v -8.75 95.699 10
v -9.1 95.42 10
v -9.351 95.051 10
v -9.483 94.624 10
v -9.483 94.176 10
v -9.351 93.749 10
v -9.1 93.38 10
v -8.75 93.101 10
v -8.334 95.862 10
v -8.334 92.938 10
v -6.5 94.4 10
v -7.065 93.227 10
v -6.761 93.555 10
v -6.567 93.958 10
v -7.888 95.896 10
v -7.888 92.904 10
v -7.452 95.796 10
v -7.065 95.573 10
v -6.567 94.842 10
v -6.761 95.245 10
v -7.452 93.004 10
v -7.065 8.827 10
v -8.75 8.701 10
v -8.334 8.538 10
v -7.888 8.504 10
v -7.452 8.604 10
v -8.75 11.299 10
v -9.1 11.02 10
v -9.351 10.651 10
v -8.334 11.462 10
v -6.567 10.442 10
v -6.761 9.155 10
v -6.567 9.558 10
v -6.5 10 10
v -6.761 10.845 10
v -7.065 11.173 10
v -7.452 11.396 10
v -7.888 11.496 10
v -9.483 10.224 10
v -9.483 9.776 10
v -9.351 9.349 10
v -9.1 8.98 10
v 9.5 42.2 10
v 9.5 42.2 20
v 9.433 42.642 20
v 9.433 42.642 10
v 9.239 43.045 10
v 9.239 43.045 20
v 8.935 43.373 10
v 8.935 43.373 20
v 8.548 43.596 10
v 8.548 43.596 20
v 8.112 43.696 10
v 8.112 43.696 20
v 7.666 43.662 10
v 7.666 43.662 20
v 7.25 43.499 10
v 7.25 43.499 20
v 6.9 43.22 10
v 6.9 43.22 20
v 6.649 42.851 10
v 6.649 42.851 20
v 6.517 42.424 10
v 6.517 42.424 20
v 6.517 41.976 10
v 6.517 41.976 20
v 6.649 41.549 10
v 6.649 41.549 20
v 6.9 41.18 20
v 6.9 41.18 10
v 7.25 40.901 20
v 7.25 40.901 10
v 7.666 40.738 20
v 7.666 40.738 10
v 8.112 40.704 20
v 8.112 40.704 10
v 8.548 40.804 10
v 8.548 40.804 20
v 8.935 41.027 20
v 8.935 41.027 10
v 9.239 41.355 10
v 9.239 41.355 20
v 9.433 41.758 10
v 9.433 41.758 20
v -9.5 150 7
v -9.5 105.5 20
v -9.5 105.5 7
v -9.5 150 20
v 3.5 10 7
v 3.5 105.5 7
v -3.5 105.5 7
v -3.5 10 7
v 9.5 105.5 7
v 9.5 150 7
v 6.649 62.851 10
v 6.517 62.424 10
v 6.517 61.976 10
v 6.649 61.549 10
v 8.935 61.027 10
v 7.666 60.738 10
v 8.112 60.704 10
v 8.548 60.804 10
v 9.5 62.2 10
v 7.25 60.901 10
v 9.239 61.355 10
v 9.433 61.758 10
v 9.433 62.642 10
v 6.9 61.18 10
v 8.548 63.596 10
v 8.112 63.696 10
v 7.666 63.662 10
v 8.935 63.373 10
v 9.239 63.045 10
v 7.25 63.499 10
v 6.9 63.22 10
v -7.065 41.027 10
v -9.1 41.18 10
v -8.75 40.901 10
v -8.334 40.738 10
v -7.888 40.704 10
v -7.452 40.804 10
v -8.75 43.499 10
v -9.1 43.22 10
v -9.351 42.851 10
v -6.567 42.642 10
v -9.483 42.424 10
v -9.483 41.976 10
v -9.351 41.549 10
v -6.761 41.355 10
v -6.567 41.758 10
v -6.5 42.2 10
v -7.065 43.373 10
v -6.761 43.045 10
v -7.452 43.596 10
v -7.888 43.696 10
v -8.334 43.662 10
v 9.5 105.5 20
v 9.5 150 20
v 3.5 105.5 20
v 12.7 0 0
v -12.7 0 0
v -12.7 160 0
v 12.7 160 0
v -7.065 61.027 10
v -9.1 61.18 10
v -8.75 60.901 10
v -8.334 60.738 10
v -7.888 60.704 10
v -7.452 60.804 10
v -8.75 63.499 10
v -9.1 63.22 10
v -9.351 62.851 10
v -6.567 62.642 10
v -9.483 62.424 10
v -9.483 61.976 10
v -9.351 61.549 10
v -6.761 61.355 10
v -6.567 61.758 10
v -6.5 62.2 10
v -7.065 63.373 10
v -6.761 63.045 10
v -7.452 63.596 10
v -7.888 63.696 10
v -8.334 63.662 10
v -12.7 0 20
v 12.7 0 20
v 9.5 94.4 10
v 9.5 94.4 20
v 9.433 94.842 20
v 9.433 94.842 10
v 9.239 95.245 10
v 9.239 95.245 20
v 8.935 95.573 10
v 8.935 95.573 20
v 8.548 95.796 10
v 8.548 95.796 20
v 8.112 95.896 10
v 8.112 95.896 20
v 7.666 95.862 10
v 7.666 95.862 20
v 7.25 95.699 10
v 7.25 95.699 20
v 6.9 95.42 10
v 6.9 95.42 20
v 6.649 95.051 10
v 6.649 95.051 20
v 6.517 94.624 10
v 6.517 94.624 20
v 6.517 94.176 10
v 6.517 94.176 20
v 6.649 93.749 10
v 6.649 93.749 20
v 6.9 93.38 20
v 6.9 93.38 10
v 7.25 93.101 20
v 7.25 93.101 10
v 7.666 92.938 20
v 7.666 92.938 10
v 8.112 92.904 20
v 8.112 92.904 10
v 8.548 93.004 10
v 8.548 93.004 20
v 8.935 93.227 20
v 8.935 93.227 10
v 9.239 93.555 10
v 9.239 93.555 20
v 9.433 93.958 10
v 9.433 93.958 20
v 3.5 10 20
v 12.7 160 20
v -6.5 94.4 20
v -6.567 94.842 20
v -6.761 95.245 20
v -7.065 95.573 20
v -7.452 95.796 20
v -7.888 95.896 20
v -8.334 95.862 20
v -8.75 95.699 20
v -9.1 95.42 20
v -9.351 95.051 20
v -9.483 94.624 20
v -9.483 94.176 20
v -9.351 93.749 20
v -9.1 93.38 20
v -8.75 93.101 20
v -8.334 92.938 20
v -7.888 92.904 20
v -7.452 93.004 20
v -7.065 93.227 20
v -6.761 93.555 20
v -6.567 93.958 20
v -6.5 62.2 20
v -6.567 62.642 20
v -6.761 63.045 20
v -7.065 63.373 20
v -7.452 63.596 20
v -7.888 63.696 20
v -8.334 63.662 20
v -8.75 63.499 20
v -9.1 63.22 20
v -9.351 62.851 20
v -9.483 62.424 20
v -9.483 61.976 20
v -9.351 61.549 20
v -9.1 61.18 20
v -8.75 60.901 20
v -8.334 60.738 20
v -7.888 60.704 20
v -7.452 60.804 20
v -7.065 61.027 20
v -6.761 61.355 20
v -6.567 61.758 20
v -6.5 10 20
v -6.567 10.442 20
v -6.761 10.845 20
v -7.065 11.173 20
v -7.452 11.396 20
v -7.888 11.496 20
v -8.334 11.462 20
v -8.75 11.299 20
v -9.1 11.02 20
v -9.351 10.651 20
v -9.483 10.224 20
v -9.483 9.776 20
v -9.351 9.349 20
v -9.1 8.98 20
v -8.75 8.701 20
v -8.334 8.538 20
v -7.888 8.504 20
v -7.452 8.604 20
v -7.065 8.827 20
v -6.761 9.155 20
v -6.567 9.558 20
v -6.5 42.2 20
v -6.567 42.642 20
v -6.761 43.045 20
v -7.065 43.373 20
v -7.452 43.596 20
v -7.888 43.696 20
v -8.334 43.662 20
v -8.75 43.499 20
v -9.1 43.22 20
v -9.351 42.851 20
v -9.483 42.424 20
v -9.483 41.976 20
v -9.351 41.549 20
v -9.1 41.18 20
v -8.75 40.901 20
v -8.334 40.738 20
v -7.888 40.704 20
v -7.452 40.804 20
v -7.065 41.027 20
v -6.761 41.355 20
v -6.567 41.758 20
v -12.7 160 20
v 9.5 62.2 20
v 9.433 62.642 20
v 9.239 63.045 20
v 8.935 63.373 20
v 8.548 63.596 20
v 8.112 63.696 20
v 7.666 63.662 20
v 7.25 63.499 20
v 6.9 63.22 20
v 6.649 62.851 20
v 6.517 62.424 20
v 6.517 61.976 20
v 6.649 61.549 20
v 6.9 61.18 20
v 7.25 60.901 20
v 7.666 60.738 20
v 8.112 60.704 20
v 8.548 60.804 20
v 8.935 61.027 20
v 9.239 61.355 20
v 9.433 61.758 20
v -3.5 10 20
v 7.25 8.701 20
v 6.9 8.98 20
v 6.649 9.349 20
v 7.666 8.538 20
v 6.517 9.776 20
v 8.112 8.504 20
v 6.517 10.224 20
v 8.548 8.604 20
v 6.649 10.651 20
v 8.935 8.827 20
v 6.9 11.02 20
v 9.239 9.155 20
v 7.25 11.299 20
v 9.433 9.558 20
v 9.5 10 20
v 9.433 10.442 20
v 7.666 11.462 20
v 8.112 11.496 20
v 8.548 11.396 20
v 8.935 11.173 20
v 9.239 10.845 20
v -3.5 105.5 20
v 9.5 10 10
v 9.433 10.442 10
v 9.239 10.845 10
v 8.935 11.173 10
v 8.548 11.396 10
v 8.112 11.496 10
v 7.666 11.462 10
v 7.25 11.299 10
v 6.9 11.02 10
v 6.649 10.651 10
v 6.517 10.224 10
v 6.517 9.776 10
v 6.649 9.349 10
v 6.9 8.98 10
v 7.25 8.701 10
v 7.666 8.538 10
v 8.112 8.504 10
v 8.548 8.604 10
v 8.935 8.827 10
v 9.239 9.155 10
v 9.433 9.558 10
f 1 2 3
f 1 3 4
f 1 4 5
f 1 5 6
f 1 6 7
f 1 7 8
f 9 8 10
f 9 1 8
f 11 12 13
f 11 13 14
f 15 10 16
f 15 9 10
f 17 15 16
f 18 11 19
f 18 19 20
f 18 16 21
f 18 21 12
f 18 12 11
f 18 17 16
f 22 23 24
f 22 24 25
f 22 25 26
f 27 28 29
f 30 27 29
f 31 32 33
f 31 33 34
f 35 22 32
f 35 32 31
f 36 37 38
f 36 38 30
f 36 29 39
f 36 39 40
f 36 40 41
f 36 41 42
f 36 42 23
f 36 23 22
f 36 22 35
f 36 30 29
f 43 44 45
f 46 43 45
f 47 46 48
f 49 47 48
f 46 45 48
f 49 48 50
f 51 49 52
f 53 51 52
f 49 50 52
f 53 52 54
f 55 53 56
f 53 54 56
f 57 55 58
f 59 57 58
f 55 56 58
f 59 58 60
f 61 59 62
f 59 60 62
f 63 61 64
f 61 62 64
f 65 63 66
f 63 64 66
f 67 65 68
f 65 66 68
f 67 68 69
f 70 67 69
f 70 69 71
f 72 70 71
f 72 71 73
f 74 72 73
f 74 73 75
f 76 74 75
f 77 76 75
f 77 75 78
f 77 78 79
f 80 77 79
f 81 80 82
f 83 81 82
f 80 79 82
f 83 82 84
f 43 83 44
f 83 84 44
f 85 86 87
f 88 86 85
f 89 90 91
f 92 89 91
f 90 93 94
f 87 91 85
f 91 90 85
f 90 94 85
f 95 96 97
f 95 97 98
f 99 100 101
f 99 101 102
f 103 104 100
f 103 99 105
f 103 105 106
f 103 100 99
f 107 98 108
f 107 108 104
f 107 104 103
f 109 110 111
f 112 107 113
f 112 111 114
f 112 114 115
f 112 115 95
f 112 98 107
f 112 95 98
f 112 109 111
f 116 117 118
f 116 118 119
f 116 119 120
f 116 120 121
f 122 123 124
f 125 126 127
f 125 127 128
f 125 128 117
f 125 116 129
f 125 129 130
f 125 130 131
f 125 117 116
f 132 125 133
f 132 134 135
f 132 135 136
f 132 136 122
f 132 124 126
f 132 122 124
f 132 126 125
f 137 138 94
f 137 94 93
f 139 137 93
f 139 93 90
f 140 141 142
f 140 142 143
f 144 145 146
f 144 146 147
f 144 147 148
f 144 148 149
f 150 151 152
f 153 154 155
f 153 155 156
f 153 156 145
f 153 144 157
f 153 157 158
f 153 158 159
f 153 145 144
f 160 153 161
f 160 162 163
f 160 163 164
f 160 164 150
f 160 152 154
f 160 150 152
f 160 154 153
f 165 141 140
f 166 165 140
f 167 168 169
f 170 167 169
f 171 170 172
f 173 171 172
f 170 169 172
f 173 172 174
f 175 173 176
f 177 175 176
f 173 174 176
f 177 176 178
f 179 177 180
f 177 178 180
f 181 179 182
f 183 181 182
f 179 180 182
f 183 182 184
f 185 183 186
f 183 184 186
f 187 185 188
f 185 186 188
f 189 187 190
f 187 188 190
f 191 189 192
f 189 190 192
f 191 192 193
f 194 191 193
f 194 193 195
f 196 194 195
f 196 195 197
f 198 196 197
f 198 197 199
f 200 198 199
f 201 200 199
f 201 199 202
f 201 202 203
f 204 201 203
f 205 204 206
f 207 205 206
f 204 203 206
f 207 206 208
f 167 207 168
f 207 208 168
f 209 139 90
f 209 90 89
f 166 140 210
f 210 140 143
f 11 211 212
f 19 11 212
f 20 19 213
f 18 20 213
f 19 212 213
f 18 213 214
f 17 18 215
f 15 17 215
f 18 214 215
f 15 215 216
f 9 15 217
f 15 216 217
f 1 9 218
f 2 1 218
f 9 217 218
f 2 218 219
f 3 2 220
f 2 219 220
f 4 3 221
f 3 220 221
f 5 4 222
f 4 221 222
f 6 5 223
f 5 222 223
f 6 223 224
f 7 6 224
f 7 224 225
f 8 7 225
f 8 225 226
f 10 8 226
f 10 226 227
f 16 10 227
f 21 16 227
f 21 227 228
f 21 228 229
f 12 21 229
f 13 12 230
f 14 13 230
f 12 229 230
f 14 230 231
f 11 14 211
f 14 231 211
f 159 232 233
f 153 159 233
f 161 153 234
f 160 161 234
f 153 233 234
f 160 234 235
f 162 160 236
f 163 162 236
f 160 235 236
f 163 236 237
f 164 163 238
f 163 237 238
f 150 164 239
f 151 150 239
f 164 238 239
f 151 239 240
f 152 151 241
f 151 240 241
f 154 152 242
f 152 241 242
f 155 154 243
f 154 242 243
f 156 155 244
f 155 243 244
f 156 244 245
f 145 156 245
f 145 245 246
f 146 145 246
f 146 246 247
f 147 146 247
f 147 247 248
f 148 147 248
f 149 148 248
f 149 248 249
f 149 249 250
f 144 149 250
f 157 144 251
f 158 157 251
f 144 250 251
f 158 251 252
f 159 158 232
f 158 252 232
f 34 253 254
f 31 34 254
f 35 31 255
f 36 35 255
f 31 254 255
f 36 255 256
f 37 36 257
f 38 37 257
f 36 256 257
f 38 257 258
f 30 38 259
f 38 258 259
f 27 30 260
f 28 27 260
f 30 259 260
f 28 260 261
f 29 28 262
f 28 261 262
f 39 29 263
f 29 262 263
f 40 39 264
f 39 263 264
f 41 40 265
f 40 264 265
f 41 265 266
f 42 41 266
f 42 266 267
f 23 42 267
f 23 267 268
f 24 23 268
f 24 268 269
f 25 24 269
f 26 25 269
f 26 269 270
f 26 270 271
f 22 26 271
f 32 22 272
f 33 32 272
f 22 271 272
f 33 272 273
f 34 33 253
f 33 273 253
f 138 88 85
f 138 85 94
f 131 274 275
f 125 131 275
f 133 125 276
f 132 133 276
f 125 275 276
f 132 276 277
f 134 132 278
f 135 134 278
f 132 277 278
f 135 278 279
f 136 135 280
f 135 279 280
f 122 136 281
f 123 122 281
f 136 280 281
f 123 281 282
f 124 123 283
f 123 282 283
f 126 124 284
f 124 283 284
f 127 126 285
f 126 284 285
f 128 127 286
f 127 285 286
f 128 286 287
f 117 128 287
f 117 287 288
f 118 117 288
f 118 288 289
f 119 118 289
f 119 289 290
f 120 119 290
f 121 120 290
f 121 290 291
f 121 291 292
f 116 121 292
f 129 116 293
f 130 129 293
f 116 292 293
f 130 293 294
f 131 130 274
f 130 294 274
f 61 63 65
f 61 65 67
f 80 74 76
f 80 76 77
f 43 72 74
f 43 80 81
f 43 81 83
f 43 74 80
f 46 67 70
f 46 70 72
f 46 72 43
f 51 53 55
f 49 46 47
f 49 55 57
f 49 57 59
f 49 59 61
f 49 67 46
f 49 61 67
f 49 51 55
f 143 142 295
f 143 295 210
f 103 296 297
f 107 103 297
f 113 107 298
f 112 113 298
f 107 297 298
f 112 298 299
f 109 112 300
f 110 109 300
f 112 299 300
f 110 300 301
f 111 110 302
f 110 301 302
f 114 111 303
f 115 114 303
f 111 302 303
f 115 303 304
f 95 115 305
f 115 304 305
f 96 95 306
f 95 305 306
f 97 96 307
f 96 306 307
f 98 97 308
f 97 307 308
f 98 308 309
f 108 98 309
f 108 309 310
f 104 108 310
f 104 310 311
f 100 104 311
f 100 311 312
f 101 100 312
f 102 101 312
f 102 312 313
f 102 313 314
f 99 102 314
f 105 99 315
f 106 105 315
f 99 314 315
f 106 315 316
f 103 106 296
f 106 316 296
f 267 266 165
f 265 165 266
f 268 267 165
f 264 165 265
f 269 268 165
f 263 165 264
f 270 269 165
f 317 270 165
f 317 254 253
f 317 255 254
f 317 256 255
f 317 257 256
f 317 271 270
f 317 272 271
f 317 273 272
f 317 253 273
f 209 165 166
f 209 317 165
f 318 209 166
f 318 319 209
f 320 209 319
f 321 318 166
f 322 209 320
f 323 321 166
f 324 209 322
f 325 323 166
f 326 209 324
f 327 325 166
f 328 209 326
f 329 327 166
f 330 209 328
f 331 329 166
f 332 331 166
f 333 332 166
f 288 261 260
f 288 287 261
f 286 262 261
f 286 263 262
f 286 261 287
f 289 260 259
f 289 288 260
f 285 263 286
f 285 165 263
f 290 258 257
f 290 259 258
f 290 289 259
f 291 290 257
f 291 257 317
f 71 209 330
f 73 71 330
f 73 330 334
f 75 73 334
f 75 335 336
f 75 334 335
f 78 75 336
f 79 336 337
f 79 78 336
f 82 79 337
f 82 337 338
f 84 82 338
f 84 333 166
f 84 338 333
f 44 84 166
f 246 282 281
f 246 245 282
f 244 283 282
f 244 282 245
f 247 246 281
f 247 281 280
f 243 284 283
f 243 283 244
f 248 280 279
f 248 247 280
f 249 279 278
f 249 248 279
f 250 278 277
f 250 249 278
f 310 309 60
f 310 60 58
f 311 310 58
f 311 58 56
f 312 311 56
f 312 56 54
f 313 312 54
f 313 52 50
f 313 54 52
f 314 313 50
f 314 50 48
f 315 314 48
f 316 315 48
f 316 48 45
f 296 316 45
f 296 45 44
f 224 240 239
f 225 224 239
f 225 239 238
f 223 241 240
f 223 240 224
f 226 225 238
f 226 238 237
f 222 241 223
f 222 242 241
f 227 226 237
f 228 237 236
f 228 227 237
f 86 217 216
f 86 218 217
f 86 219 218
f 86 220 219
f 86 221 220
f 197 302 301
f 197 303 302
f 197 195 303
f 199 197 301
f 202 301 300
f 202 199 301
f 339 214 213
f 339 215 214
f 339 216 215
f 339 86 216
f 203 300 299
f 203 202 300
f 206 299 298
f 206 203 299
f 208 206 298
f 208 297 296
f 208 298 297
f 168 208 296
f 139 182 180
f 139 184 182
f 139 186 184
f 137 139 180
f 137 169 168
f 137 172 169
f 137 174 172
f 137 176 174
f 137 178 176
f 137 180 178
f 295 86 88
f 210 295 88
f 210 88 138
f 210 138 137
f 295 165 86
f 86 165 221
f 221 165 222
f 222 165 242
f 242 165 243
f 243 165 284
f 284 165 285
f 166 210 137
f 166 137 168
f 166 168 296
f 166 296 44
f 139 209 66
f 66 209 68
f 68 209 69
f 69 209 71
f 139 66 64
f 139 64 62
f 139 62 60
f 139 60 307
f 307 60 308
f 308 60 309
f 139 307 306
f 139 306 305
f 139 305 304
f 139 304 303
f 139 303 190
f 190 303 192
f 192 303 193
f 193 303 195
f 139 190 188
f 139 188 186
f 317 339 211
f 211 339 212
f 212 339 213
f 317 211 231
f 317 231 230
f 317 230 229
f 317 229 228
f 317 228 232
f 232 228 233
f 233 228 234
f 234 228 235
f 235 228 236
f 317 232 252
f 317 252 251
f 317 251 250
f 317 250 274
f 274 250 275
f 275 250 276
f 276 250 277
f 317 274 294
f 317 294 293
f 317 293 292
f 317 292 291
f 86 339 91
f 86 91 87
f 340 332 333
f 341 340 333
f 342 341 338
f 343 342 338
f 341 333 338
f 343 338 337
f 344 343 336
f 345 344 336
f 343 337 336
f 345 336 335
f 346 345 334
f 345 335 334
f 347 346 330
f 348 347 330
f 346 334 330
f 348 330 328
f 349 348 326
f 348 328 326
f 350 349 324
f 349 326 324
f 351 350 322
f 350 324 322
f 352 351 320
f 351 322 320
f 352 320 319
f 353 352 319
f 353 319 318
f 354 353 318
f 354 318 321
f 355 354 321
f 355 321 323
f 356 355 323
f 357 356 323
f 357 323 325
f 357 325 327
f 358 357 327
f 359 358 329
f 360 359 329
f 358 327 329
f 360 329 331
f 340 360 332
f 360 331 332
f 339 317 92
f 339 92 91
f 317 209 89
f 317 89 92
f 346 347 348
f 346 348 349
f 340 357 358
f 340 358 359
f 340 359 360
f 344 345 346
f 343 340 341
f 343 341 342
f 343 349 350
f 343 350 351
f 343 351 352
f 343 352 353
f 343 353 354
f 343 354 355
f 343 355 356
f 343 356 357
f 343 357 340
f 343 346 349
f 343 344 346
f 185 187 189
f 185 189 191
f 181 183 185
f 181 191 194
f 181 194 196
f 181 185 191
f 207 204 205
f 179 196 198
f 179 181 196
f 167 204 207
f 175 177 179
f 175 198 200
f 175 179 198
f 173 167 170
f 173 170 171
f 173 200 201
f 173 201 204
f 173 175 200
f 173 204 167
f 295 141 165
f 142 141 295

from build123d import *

# Parameters (mm, degrees)
SKETCH_W        = 25.4
SKETCH_H        = 160
PAD_DEPTH       = 20
POCKET_DEPTH    = 13
SKETCH002_R     = 1.5
POCKET001_DEPTH = 10


with BuildPart() as part:
    # Sketch → Pad (new body)
    with BuildSketch(Plane.XY):
        with Locations((0, 80)):
            Rectangle(SKETCH_W, SKETCH_H)
    extrude(amount=PAD_DEPTH)

    # Sketch001 (on Face6 of Pad) → Pocket (cut)
    with BuildSketch(Plane.XY.offset(20)):
        Polygon((-9.5, 150), (9.5, 150), (9.5, 105.5), (3.5, 105.5), (3.5, 10), (-3.5, 10), (-3.5, 105.5), (-9.5, 105.5), align=None)
    extrude(amount=-POCKET_DEPTH, mode=Mode.SUBTRACT)

    # Sketch002 (on Face5 of Pocket) → Pocket001 (cut)
    with BuildSketch(Plane.XY.offset(20)):
        with Locations((-8, 94.4)):
            Circle(SKETCH002_R)
        with Locations((-8, 62.2)):
            Circle(SKETCH002_R)
        with Locations((8, 94.4)):
            Circle(SKETCH002_R)
        with Locations((8, 62.2)):
            Circle(SKETCH002_R)
        with Locations((-8, 42.2)):
            Circle(SKETCH002_R)
        with Locations((-8, 10)):
            Circle(SKETCH002_R)
        with Locations((8, 42.2)):
            Circle(SKETCH002_R)
        with Locations((8, 10)):
            Circle(SKETCH002_R)
    extrude(amount=-POCKET001_DEPTH, mode=Mode.SUBTRACT)


solid = part.part
